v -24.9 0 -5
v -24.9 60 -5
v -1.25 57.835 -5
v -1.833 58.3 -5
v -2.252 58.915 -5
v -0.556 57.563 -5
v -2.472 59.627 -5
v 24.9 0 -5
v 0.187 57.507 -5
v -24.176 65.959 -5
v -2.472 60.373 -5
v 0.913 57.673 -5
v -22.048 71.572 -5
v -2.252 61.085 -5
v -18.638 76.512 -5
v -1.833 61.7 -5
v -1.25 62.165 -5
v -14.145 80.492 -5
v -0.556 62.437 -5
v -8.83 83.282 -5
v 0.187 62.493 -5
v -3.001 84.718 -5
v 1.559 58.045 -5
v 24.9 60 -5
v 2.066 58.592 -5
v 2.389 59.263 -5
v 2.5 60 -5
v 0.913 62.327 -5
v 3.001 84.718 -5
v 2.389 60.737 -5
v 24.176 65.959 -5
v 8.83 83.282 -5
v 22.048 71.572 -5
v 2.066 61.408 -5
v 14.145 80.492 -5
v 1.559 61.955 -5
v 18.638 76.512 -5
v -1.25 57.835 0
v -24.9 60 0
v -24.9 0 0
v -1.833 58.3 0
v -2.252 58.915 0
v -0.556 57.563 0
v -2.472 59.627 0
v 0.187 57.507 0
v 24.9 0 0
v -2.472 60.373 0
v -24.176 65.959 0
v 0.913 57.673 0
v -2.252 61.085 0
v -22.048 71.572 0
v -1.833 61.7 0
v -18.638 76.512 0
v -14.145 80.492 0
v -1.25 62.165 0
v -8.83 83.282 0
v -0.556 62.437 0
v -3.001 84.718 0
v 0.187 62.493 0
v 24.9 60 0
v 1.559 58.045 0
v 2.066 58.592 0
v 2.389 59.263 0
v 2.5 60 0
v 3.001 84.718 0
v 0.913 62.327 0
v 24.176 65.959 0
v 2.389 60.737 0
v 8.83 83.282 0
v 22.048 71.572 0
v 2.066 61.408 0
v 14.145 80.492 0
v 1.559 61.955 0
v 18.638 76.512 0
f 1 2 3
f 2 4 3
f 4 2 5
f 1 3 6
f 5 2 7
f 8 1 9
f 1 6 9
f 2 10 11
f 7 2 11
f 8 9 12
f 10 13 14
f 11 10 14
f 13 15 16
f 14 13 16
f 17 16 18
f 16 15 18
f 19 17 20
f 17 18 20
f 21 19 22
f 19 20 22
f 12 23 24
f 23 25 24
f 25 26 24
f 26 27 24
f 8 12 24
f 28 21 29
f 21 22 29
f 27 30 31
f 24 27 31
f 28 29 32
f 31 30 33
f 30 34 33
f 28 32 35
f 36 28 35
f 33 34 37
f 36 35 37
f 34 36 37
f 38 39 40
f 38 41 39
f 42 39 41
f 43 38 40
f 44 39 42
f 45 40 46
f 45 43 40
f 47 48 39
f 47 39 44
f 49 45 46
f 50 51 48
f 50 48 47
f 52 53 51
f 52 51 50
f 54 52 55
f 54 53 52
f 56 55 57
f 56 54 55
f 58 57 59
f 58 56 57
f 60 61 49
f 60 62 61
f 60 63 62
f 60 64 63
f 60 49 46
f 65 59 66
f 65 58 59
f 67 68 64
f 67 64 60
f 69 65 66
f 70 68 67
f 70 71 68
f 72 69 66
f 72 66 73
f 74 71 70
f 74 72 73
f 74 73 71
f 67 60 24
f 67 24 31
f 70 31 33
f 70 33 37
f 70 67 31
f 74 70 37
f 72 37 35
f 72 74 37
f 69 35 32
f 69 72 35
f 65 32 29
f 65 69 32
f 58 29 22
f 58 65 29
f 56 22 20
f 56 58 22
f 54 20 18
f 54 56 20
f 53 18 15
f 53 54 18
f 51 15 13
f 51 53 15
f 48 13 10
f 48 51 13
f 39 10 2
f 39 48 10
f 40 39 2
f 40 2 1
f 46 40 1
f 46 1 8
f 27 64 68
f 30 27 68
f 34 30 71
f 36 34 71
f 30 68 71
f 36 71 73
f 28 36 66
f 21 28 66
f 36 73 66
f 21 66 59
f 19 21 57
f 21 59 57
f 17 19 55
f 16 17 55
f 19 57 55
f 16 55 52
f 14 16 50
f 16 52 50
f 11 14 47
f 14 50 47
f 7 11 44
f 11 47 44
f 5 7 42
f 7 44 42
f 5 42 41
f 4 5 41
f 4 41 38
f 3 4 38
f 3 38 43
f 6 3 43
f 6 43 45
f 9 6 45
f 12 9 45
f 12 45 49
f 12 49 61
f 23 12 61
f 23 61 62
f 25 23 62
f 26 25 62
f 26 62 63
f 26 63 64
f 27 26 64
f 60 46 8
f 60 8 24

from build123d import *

# Parameters (mm, degrees)
BOSS_EXTRUDE1_DEPTH = 5
SKETCH2_R           = 2.5
CUT_EXTRUDE1_DEPTH  = 50


with BuildPart() as part:
    # Sketch1 → Boss-Extrude1 (new body)
    with BuildSketch(Plane.XY):
        with BuildLine():
            ThreePointArc((24.9, 60), (0, 84.9), (-24.9, 60))
            Line((-24.9, 60), (24.9, 60))
        make_face()
        with BuildLine():
            Line((24.9, 60), (-24.9, 60))
            ThreePointArc((-24.9, 60), (0, 35.1), (24.9, 60))
        make_face()
        with BuildLine():
            Line((-24.9, 60), (-24.9, 0))
            Line((-24.9, 0), (24.9, 0))
            Line((24.9, 0), (24.9, 60))
            ThreePointArc((24.9, 60), (0, 35.1), (-24.9, 60))
        make_face()
    extrude(amount=-BOSS_EXTRUDE1_DEPTH)

    # Sketch2 → Cut-Extrude1 (cut)
    with BuildSketch(Plane.XY):
        with Locations((0, 60)):
            Circle(SKETCH2_R)
    extrude(amount=-CUT_EXTRUDE1_DEPTH, mode=Mode.SUBTRACT)


solid = part.part
